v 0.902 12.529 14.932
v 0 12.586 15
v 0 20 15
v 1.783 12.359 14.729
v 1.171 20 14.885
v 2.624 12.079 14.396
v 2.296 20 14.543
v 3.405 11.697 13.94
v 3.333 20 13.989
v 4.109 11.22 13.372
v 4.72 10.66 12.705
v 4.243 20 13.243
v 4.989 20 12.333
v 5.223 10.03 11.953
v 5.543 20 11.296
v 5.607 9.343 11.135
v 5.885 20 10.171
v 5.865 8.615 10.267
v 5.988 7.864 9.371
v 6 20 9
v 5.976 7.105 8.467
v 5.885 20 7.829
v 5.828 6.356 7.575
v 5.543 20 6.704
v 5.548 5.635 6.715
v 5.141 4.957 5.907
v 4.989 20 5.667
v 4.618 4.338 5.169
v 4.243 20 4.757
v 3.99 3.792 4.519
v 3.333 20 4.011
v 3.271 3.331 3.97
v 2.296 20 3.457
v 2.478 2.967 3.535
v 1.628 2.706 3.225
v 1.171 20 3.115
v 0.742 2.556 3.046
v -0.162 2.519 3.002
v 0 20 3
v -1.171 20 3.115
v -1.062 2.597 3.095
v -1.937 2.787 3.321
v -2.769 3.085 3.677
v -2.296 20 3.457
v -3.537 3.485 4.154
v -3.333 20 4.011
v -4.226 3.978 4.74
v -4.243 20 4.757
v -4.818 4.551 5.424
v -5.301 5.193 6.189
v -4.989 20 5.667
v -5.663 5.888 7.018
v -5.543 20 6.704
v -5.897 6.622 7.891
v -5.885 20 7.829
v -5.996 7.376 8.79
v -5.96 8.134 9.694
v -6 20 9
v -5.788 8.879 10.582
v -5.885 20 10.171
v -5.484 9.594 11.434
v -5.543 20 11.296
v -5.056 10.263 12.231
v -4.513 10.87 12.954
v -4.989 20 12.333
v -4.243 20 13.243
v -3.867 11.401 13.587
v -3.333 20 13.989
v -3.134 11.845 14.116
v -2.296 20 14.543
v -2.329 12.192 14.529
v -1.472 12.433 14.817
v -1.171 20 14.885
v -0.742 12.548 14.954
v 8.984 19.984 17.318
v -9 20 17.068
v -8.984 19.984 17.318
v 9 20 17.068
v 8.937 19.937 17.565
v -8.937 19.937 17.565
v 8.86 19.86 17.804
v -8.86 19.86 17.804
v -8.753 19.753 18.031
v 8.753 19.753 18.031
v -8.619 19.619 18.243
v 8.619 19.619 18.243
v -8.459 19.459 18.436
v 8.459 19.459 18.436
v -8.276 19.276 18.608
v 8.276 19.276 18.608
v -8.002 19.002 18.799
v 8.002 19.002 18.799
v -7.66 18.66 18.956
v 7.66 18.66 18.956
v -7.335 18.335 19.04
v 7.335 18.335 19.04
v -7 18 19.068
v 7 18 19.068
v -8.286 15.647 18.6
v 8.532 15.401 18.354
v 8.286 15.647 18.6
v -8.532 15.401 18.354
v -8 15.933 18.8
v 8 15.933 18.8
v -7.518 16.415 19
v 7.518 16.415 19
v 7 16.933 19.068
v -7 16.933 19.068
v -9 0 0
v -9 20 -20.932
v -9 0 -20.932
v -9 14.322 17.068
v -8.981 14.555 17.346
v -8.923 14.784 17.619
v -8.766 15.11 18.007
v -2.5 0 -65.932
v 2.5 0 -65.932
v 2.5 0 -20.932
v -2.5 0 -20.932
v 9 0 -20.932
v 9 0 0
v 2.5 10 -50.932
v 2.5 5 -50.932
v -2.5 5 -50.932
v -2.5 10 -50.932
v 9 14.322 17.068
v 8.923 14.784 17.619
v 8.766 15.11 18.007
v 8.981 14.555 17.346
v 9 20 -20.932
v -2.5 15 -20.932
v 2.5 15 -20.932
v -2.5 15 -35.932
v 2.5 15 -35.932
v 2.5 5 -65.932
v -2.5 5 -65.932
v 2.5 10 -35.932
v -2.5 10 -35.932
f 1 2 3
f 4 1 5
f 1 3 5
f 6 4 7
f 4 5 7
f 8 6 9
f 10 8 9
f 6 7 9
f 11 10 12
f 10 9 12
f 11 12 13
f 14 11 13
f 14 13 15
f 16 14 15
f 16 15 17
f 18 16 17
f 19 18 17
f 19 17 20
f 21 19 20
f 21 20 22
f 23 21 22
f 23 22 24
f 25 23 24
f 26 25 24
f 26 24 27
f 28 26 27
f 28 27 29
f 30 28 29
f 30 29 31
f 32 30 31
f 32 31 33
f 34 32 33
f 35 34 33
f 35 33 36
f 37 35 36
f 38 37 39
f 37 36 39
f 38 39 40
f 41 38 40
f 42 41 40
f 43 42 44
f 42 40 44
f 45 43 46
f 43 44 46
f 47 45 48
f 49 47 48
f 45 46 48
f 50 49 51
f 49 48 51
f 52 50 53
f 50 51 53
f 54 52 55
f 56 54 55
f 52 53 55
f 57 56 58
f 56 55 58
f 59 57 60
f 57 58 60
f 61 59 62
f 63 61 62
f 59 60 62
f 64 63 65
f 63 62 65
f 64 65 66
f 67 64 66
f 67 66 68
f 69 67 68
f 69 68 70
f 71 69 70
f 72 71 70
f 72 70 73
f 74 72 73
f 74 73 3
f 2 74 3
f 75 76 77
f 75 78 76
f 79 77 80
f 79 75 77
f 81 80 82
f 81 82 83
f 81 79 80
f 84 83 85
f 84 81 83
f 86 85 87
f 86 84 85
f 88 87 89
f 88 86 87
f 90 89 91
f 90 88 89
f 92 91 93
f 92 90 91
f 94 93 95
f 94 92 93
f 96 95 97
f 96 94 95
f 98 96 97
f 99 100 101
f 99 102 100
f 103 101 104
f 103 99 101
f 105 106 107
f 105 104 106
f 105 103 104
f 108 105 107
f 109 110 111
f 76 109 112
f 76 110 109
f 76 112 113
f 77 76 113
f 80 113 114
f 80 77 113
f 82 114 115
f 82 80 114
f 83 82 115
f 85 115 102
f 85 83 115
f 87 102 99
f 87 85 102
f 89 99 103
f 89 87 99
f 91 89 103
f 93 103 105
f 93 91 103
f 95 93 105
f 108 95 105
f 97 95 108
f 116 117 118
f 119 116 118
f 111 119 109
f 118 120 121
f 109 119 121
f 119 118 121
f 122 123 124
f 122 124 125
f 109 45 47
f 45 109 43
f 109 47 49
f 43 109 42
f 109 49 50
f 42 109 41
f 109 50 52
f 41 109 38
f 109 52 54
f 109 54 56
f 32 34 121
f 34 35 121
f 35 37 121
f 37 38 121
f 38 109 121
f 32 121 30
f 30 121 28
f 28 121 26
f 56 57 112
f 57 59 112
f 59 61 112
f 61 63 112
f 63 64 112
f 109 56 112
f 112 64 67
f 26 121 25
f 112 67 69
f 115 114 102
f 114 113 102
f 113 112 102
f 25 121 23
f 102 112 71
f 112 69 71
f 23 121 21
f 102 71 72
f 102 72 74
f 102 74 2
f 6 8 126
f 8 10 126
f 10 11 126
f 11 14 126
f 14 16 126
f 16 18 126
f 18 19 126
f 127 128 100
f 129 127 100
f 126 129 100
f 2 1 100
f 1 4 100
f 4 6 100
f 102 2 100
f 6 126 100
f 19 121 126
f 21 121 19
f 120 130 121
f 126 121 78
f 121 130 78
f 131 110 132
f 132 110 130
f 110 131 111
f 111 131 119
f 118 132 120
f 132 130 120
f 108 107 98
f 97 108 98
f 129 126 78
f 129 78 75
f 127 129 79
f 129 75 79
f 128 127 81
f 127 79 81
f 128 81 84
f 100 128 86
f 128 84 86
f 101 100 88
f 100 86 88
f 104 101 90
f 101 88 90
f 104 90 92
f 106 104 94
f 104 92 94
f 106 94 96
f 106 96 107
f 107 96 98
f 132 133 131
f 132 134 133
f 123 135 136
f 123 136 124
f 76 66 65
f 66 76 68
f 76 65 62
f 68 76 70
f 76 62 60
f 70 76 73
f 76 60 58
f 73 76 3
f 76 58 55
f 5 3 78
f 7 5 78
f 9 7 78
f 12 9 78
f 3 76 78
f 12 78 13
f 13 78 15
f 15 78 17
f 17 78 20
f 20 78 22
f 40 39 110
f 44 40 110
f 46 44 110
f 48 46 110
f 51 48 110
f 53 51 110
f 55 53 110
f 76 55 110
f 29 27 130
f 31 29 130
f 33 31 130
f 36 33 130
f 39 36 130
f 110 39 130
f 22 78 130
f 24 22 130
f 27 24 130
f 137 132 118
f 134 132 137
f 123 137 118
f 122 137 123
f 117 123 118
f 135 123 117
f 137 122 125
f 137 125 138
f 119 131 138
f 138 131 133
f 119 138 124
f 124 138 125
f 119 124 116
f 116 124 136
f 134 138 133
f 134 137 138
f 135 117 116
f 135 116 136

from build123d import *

# Parameters (mm, degrees)
EXTRUDE_1_DEPTH     = 9
EXTRUDE_2_DEPTH     = 2.5
SKETCH_2_R          = 6
CUT_EXTRUDE_1_DEPTH = 35
FILLET_2_R          = 2


with BuildPart() as part:
    # Эскиз1 → Бобышка-Вытянуть1 (new, symmetric)
    with BuildSketch(Plane(origin=(0, 0, 0), x_dir=(0, 0, -1), z_dir=(1, 0, 0))):
        Polygon((-19.068057482, 16), (0, 0), (20.931942518, 0), (20.931942518, 15), (20.931942518, 20), (-19.068057482, 20), align=None)
    extrude(amount=EXTRUDE_1_DEPTH, both=True)

    # Эскиз1<3> → Бобышка-Вытянуть2 (add, symmetric)
    with BuildSketch(Plane(origin=(0, 0, 0), x_dir=(0, 0, -1), z_dir=(1, 0, 0))):
        Polygon((20.931942518, 15), (20.931942518, 0), (65.931942518, 0), (65.931942518, 5), (50.931942518, 5), (50.931942518, 10), (35.931942518, 10), (35.931942518, 15), align=None)
    extrude(amount=EXTRUDE_2_DEPTH, both=True)

    # Эскиз2 → Вырез-Вытянуть1 (cut)
    with BuildSketch(Plane(origin=(0, 20, 0), x_dir=(1, 0, 0), z_dir=(0, 1, 0))):
        with Locations((0, -9)):
            Circle(SKETCH_2_R)
    extrude(amount=-CUT_EXTRUDE_1_DEPTH, mode=Mode.SUBTRACT)

    # Скругление2
    fillet_2_edges = [part.edges().sort_by_distance(p)[0] for p in [
        (0, 20, 19.068057482),
        (9, 18, 19.068057482),
        (0, 16, 19.068057482),
        (-9, 18, 19.068057482),
    ]]
    fillet(fillet_2_edges, radius=FILLET_2_R)


solid = part.part
